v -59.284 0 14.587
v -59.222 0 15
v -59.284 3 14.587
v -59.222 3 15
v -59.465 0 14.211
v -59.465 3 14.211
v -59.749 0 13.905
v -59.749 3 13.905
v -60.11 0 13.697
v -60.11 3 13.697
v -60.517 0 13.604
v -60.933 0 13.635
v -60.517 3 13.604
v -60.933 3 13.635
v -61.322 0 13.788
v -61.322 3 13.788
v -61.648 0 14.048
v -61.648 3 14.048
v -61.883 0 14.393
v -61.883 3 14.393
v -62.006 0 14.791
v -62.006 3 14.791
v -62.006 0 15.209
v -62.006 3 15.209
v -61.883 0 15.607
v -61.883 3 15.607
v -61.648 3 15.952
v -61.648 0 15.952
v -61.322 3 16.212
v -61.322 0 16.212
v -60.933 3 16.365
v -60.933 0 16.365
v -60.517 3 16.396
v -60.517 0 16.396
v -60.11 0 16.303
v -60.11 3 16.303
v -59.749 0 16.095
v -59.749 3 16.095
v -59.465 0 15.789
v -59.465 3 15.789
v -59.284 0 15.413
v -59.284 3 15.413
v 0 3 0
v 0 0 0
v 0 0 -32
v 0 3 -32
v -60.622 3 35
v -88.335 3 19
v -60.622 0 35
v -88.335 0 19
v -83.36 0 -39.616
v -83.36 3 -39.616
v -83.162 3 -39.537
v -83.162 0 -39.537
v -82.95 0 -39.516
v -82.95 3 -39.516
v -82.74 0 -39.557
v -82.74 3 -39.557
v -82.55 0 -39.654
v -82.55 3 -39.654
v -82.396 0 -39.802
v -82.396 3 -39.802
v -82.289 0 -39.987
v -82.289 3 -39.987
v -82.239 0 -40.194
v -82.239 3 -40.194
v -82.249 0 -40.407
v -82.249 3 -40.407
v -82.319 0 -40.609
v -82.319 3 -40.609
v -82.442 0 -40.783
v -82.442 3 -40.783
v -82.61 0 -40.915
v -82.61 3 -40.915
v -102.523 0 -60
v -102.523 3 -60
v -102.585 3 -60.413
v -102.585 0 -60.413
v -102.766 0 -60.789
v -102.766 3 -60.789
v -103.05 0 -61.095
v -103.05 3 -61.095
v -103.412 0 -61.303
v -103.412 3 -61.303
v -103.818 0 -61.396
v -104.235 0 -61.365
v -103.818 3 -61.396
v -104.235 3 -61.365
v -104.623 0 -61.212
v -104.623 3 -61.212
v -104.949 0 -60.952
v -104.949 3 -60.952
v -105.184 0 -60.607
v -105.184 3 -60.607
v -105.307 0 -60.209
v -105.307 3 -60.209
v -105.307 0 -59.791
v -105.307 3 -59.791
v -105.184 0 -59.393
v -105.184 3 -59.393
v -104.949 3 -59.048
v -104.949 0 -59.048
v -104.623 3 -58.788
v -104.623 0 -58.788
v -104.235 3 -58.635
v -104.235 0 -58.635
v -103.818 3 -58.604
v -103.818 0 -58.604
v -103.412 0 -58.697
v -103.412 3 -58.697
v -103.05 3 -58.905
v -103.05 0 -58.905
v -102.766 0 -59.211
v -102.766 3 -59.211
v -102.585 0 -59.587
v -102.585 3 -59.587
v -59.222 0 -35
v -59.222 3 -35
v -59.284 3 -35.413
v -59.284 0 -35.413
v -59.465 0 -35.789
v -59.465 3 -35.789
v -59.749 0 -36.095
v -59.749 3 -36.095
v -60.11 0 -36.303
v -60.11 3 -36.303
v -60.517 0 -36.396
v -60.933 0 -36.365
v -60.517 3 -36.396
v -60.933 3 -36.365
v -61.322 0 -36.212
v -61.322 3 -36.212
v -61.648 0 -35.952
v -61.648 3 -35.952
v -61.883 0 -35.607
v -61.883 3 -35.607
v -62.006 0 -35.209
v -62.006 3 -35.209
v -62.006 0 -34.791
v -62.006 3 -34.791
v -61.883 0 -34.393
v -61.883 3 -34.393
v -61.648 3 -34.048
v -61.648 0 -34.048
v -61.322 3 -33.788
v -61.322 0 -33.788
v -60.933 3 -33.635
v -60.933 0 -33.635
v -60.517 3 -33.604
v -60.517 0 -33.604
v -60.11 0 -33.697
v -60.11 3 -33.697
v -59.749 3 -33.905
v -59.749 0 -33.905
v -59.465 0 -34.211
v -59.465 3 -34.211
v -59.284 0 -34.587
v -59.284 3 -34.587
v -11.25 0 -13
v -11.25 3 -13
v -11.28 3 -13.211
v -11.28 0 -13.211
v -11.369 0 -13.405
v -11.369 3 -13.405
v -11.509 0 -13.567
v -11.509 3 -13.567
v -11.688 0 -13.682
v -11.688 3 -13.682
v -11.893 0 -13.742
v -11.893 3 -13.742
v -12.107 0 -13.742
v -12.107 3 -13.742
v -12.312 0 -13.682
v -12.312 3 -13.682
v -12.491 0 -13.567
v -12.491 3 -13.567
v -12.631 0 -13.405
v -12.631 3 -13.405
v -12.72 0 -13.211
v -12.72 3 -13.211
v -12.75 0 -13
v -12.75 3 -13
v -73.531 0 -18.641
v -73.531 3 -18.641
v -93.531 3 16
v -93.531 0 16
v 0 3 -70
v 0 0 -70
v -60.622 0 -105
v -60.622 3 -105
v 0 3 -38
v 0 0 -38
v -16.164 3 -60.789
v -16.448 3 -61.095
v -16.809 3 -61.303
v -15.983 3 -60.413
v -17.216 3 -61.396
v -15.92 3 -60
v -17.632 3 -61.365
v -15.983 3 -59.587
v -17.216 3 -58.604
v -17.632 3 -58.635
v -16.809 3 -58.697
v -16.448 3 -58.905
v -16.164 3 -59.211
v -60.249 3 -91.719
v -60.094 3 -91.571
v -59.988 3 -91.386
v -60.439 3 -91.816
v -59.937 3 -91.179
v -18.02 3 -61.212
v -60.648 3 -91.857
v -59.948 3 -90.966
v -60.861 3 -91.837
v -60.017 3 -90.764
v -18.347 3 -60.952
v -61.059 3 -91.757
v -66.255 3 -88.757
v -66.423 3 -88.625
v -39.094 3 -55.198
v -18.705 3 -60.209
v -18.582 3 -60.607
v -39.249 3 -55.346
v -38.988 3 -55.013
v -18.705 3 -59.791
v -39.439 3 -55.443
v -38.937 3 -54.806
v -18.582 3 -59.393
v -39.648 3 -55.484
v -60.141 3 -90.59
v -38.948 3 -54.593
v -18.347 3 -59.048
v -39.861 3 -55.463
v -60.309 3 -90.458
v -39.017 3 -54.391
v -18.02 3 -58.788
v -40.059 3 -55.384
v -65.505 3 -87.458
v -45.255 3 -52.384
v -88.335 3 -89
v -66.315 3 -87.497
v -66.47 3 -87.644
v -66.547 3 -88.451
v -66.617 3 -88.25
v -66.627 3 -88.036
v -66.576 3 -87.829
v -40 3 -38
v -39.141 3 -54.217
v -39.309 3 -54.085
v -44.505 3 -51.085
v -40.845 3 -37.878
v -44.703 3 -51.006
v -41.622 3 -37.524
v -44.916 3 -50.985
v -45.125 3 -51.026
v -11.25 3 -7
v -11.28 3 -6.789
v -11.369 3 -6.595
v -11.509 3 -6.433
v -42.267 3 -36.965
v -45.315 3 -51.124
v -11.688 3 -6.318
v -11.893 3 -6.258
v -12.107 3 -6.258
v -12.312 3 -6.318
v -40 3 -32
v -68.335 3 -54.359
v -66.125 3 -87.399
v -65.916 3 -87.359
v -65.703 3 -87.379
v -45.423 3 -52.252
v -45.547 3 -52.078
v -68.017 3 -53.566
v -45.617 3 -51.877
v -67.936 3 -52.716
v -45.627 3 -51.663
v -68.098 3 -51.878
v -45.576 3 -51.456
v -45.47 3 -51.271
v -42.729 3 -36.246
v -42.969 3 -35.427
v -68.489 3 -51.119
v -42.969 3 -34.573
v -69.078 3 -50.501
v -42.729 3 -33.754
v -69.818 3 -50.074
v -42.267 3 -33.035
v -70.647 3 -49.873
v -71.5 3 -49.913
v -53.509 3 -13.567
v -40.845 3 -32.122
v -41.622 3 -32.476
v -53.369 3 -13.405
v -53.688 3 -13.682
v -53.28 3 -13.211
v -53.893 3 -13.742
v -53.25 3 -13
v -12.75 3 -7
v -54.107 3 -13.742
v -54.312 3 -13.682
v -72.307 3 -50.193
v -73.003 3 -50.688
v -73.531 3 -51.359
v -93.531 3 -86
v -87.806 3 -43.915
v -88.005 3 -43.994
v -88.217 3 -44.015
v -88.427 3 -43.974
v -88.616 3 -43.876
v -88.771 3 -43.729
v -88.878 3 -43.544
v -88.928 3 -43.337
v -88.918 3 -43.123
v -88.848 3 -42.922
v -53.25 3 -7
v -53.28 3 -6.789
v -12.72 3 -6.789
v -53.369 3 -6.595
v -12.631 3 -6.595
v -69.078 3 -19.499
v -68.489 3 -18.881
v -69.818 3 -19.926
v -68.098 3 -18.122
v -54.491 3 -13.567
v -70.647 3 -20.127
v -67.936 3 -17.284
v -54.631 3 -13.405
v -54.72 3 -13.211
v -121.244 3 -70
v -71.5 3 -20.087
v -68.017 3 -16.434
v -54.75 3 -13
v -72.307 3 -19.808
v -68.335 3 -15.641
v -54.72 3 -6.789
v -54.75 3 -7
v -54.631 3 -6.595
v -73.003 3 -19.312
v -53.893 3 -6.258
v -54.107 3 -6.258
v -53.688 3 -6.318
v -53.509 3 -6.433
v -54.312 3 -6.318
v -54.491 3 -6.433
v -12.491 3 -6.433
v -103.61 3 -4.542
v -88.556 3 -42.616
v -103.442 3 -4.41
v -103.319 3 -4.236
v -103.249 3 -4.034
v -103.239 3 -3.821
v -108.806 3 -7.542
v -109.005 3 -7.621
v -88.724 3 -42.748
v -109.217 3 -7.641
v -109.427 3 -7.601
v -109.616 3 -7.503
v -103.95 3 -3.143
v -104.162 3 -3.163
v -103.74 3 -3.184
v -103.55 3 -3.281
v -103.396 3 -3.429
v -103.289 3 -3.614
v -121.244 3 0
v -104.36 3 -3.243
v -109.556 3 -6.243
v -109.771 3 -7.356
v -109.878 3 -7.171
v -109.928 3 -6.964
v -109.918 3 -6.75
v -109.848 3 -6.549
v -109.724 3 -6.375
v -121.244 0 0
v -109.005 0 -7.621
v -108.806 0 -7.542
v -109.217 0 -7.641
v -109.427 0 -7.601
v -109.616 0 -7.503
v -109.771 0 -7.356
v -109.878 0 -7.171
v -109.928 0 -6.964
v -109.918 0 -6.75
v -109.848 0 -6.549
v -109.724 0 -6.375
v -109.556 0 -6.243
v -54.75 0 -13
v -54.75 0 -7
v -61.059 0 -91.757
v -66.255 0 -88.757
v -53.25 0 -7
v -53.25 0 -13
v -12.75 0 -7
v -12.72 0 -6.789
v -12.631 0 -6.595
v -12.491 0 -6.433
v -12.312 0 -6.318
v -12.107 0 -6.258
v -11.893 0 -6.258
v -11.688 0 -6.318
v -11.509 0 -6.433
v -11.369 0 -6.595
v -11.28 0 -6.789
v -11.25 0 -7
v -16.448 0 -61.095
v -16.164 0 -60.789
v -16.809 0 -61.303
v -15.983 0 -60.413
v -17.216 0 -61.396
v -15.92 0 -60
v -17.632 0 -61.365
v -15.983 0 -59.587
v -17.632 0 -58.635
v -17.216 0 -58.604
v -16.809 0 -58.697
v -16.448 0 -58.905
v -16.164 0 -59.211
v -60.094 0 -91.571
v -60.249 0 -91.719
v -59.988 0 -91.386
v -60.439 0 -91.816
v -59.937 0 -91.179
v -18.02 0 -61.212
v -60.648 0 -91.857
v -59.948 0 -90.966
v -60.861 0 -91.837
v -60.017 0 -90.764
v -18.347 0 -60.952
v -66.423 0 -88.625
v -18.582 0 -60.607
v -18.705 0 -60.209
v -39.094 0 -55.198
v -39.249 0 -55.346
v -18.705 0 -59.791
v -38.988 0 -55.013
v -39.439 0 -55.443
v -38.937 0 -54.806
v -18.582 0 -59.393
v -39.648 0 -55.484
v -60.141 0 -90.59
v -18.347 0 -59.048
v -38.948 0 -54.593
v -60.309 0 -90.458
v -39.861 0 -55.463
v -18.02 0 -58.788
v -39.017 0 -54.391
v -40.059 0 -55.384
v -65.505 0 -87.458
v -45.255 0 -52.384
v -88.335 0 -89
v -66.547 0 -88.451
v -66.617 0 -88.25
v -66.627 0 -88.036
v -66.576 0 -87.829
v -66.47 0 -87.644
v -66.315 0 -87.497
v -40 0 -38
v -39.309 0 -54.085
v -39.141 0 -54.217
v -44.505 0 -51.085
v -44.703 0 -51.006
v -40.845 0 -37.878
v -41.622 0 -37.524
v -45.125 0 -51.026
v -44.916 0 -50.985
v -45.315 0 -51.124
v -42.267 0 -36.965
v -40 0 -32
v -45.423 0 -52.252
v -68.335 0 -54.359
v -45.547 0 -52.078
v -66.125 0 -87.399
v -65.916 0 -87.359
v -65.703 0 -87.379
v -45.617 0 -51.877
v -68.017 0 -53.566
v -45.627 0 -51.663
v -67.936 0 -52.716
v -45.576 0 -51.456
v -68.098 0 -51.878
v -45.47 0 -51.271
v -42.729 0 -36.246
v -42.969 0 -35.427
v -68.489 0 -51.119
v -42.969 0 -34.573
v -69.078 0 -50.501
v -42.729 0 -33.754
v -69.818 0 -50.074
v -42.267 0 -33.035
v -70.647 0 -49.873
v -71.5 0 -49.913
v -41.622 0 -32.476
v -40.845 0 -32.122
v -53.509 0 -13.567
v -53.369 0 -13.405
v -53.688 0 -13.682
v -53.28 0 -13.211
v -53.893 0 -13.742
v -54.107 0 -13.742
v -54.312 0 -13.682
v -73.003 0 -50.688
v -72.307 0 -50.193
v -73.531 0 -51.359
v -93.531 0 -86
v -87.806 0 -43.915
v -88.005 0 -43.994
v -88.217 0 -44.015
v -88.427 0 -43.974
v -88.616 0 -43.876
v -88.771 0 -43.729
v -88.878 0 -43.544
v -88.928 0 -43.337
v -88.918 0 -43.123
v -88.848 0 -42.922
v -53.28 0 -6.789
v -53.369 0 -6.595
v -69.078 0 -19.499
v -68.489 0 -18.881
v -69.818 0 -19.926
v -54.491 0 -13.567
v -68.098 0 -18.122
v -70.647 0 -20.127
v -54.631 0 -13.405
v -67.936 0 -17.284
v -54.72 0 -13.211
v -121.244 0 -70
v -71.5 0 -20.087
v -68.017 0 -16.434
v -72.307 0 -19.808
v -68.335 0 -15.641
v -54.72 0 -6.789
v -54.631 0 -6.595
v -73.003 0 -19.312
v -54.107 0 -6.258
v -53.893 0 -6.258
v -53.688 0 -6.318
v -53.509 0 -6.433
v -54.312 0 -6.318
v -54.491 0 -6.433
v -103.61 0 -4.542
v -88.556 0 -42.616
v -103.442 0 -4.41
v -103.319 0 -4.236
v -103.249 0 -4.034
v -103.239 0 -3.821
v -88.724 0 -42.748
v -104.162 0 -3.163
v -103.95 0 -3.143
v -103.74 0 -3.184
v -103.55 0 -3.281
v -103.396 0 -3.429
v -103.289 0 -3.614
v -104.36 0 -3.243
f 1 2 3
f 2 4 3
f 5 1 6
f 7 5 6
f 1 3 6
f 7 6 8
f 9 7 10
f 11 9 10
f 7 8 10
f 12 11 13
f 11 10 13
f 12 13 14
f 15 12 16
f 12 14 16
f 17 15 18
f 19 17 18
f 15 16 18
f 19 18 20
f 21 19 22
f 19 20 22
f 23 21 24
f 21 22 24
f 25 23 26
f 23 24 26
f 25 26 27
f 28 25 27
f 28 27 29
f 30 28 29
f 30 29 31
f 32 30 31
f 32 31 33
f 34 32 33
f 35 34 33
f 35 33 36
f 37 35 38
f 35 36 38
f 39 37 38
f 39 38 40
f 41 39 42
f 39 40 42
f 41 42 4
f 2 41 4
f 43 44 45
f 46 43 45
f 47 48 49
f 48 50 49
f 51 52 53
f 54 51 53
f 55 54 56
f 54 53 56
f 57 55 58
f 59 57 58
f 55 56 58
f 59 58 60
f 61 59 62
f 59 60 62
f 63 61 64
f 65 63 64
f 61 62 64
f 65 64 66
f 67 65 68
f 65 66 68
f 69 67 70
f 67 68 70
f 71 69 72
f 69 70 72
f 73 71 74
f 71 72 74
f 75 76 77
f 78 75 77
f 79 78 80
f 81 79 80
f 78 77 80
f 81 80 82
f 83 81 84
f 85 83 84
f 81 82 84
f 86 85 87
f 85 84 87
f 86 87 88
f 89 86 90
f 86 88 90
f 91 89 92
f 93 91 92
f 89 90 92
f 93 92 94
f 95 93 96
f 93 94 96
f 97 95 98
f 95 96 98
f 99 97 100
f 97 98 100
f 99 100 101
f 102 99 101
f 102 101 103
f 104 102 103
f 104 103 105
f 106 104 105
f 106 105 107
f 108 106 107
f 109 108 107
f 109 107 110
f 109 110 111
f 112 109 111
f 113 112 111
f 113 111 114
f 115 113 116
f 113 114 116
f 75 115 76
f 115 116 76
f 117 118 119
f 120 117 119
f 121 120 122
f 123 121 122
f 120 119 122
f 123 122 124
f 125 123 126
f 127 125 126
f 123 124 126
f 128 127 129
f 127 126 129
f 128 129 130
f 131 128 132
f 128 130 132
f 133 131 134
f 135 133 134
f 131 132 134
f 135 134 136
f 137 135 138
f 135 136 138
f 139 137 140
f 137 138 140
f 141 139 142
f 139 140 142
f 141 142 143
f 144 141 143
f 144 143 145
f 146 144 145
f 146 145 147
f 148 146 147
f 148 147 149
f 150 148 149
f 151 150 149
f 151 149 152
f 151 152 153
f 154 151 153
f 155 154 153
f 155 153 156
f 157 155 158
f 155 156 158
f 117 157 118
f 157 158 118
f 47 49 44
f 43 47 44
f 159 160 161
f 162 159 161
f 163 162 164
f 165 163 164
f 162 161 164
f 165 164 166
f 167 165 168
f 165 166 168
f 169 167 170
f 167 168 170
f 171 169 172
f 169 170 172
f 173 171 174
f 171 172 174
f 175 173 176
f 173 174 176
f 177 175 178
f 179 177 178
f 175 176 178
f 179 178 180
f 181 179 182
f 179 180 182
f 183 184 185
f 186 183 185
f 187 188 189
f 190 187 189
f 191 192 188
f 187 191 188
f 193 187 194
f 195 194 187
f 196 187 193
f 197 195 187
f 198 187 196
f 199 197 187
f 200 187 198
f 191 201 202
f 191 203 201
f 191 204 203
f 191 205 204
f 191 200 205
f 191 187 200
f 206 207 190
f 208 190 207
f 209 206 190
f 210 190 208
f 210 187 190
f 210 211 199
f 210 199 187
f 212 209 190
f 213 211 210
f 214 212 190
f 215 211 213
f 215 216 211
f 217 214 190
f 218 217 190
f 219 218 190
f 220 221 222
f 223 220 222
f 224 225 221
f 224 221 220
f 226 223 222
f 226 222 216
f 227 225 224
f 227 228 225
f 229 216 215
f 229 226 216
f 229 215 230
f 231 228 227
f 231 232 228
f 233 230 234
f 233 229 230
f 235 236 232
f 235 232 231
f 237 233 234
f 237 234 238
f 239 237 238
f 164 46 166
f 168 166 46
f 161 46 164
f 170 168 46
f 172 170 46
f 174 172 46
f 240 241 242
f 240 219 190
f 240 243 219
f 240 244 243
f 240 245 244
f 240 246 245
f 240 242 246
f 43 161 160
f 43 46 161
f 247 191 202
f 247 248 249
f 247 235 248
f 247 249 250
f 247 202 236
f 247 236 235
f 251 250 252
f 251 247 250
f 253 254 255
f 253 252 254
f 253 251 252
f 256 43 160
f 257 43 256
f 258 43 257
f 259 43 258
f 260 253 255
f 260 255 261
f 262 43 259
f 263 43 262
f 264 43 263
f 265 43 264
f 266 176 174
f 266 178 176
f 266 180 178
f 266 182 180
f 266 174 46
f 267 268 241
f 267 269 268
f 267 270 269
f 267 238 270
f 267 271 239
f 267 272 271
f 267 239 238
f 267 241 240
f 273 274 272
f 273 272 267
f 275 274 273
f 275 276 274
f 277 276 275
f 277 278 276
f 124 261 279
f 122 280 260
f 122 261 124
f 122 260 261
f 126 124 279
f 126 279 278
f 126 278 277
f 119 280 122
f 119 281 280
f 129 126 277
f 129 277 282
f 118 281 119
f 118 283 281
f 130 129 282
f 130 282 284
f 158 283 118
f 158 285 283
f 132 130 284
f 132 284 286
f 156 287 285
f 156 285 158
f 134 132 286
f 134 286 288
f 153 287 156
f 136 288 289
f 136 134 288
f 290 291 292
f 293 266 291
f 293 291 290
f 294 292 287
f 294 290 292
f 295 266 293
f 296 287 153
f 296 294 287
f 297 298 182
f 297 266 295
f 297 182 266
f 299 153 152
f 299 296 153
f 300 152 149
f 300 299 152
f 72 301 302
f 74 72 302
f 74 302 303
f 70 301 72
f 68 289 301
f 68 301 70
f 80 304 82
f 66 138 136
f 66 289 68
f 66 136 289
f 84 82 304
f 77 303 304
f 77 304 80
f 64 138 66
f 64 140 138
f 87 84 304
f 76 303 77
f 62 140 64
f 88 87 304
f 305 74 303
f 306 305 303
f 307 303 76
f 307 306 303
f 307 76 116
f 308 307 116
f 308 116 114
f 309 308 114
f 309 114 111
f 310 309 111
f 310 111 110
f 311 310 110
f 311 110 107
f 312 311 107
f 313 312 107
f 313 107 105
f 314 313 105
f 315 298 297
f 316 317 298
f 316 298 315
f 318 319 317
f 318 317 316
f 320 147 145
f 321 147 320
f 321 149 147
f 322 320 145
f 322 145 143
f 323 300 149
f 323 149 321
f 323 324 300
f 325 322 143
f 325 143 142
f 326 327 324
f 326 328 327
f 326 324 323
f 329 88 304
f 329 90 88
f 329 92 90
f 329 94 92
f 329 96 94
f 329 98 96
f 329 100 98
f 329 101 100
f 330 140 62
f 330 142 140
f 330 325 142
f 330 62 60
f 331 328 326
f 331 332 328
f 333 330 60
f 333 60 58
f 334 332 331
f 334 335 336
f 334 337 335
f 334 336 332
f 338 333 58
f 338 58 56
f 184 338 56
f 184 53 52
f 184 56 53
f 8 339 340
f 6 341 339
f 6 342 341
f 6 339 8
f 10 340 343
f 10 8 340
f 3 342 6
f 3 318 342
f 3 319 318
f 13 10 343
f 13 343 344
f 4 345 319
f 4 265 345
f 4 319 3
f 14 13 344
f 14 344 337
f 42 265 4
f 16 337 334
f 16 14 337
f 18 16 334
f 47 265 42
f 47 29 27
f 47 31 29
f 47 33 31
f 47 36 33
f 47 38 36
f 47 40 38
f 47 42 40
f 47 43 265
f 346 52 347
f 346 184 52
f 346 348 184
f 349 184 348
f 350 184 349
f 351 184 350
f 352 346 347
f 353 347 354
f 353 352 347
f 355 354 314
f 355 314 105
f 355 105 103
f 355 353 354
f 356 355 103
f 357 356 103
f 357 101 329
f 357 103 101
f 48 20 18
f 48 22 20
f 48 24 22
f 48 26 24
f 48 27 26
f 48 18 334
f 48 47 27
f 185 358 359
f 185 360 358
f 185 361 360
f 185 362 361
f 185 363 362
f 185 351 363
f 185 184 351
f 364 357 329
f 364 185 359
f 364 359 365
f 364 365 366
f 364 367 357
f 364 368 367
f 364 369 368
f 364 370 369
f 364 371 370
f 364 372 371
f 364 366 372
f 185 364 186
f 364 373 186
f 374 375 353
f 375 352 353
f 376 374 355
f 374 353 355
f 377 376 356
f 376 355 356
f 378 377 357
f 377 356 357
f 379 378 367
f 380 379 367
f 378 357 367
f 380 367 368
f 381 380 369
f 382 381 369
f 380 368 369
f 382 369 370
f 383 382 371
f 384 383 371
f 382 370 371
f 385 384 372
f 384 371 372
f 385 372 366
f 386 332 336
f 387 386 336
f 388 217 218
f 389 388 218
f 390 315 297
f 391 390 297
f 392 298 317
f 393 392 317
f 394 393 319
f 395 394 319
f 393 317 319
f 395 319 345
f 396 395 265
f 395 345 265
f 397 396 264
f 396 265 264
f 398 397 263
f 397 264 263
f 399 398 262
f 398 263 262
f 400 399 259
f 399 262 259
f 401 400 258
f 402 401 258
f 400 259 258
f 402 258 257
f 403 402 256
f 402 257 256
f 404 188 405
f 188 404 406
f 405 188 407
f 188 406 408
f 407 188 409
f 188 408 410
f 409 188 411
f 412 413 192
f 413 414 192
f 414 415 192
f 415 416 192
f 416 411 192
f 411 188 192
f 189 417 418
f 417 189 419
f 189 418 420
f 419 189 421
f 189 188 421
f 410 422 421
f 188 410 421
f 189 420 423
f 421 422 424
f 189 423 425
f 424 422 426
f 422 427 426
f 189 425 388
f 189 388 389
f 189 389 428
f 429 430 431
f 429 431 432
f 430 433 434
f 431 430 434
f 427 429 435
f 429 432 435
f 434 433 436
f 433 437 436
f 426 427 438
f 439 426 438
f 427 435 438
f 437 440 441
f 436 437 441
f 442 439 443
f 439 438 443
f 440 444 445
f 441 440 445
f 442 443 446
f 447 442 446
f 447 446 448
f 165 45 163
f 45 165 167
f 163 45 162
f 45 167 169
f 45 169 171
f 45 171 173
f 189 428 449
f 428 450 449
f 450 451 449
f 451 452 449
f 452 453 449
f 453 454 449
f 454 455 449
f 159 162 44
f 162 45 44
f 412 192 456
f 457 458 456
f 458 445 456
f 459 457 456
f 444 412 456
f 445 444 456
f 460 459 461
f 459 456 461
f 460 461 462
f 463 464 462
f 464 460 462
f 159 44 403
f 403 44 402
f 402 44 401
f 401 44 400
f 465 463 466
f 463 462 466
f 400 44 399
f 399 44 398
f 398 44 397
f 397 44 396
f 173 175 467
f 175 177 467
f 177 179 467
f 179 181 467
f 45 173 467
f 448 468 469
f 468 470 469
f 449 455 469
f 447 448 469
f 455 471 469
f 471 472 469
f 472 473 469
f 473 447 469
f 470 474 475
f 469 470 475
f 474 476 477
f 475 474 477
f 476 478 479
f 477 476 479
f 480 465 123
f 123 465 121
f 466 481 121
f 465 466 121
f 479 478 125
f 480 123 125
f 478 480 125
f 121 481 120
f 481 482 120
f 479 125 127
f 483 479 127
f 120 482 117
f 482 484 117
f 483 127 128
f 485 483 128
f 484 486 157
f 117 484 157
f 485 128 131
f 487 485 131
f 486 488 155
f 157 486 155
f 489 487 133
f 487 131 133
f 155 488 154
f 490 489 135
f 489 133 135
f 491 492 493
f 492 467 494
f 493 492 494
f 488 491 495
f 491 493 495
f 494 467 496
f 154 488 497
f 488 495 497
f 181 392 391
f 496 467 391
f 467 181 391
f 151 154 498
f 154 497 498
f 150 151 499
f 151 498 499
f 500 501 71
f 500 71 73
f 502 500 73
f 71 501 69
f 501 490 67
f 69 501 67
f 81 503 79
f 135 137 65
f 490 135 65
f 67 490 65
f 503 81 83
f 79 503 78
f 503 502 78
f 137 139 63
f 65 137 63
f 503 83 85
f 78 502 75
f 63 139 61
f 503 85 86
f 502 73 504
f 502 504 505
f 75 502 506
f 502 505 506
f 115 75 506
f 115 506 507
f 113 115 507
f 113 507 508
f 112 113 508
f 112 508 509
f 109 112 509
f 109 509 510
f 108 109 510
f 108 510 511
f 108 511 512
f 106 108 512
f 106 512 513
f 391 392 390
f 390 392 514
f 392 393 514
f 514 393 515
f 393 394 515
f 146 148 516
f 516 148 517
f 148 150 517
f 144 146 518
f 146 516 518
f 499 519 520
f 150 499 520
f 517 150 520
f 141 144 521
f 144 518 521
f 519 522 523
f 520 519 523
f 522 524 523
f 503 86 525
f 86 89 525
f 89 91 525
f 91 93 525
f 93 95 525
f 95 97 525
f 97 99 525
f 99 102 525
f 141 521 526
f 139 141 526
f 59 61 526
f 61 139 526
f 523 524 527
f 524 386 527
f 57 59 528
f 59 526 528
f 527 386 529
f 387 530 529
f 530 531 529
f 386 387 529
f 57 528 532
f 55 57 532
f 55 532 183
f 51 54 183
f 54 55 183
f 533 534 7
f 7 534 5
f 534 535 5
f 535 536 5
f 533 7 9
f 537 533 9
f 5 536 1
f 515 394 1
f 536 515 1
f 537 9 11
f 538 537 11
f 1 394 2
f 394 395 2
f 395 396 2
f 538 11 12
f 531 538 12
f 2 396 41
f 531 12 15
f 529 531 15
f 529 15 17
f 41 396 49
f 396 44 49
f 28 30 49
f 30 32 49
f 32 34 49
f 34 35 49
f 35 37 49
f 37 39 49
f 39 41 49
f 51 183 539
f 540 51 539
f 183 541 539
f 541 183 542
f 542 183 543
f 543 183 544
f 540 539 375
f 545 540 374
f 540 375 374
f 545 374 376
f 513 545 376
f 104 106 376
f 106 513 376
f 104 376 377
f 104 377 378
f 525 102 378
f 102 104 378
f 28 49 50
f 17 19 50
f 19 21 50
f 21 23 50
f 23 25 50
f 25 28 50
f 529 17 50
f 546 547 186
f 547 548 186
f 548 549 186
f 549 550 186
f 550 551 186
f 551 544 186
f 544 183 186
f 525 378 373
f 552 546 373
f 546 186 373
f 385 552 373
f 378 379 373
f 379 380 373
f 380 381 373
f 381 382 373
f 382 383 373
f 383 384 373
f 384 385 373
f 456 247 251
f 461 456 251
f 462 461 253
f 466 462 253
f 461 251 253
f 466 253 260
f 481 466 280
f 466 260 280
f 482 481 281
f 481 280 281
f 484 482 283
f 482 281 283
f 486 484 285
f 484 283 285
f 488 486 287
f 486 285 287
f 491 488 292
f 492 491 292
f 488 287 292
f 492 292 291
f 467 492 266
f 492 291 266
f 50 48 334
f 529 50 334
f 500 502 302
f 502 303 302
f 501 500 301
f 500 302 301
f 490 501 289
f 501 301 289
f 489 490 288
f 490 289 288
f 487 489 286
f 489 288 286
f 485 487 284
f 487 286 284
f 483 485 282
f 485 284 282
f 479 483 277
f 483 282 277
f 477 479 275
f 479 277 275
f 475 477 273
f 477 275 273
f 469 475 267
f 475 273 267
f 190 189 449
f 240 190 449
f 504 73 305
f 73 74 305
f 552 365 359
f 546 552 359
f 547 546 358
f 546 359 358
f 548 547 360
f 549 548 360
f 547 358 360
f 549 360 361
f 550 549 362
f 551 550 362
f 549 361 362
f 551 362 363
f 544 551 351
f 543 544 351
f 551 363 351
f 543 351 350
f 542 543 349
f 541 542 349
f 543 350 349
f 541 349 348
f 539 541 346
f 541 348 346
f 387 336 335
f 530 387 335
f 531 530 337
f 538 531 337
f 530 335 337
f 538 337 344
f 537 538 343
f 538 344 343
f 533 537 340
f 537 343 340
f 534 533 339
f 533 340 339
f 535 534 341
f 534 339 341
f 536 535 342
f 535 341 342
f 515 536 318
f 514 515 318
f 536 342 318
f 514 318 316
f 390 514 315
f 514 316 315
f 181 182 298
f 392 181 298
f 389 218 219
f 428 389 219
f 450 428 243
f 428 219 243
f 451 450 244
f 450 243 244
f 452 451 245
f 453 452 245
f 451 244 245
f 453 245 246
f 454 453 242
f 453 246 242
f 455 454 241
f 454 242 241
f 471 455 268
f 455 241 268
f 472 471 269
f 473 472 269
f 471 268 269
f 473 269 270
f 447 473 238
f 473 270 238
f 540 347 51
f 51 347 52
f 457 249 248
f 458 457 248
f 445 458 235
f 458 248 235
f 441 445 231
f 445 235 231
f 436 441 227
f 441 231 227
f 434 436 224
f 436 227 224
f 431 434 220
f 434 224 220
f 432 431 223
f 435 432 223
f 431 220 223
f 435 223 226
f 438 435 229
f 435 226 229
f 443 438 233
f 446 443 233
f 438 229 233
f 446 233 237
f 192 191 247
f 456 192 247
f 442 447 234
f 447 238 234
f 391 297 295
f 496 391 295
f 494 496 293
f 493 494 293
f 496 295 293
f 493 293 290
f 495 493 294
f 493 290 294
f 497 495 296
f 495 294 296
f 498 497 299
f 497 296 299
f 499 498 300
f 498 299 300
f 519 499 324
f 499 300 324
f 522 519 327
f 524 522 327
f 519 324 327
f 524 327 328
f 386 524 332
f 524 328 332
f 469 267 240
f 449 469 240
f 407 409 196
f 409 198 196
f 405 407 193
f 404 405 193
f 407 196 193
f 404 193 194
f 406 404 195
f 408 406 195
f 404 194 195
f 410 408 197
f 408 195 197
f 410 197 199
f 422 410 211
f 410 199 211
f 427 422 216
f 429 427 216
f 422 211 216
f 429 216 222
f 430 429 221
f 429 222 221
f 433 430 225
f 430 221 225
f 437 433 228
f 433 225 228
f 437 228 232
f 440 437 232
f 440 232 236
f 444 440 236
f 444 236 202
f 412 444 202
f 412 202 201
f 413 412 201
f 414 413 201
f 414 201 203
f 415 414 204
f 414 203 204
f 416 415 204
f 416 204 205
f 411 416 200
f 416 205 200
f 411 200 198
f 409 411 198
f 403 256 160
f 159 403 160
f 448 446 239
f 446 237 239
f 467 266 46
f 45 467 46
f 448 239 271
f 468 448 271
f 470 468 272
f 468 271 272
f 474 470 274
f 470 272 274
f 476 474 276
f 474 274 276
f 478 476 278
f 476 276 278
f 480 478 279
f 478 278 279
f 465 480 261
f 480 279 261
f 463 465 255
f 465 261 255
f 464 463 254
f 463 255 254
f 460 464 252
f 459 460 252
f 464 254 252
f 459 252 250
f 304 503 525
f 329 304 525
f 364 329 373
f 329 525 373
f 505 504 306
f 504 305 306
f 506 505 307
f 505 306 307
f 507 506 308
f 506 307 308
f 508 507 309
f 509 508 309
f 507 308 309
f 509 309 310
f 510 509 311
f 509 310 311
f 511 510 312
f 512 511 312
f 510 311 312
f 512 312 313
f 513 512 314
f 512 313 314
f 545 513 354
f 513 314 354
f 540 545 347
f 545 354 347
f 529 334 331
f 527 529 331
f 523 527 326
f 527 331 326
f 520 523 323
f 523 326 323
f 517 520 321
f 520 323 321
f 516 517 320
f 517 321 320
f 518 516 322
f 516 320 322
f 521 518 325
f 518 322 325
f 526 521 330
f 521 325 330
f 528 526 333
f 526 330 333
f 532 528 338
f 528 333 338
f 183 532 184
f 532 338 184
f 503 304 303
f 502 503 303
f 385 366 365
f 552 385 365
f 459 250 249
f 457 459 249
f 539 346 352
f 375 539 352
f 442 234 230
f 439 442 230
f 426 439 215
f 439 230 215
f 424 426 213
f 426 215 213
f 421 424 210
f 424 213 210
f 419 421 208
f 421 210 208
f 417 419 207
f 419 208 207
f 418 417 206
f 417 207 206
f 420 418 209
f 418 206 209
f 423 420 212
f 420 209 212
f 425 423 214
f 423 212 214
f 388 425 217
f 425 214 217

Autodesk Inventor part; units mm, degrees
ref_plane "YZ Plane" through (0, 0, 0) normal (1, 0, 0) x (0, 1, 0)
ref_plane "XZ Plane" through (0, 0, 0) normal (0, 1, 0) x (-1, 0, 0)
ref_plane "XY Plane" through (0, 0, 0) normal (0, 0, 1) x (1, 0, 0)
sketch "Sketch1" plane through (0, 0, 0) normal (0, 1, 0) x (-1, 0, 0)
  point P0 (0, 0)
sketch "Sketch2" plane through (0, 0, 0) normal (0, 1, 0) x (-1, 0, 0)
  line L0 (0, 0) -> (0, -70)
  line L1 (0, -70) -> (54.3409, -70) construction
  line L2 (0, -70) -> (60.6218, -105)
  line L3 (0, -70) -> (70, -70) construction
  line L4 (60.6218, -105) -> (121.2436, -70)
  line L5 (121.2436, -70) -> (121.2436, 0)
  line L6 (121.2436, 0) -> (60.6218, 35)
  line L7 (60.6218, 35) -> (0, 0)
  dimension "d0" = 70
  dimension "d2" = 70
  dimension "d3" = 30
  dimension "d4" = 70
  dimension "d5" = 120
  dimension "d6" = 70
  dimension "d7" = 120
extrude "Extrusion1" add sketch "Sketch2" along normal blind 3
sketch "Sketch3" plane through (0, 3, 0) normal (0, 1, 0) x (1, 0, 0)
  line L0 (0, 0) -> (0, 70) projected
  line L1 (-121.2436, 0) -> (-60.6218, -35) projected
  line L2 (-90.9327, -17.5) -> (-50.9327, -17.5) construction
  line L3 (-60.6218, 105) -> (-121.2436, 70) projected
  line L4 (-90.9327, 87.5) -> (-50.9327, 87.5) construction
  line L5 (-70.9327, 17.141) -> (-90.9327, -17.5) construction
  line L6 (-73.5307, 18.641) -> (-93.5307, -16)
  line L7 (-88.3346, -19) -> (-68.3346, 15.641)
  arc A0 (-68.3346, 15.641) -> (-73.5307, 18.641) centre (-70.9327, 17.141) ccw
  arc A1 (-93.5307, -16) -> (-88.3346, -19) centre (-90.9327, -17.5) ccw
  line L8 (-70.9327, 52.859) -> (-90.9327, 87.5) construction
  line L9 (-68.3346, 54.359) -> (-88.3346, 89)
  line L10 (-93.5307, 86) -> (-73.5307, 51.359)
  arc A2 (-73.5307, 51.359) -> (-68.3346, 54.359) centre (-70.9327, 52.859) ccw
  arc A3 (-88.3346, 89) -> (-93.5307, 86) centre (-90.9327, 87.5) ccw
  line L11 (-40, 35) -> (0, 35) construction
  line L12 (-40, 32) -> (0, 32)
  line L13 (0, 38) -> (-40, 38)
  arc A4 (-40, 38) -> (-40, 32) centre (-40, 35) ccw
  arc A5 (0, 32) -> (0, 38) centre (0, 35) ccw
  point P0 (-80.9327, -0.1795)
  point P1 (-80.9327, 70.1795)
  point P2 (-20, 35)
  dimension "d10" = 40
  dimension "d11" = 40
  dimension "d13" = 40
  dimension "d15" = 6
  dimension "d16" = 6
  dimension "d17" = 6
extrude "Extrusion3" cut sketch "Sketch3" against normal blind 3
sketch "Sketch4" plane through (0, 3, 0) normal (0, 1, 0) x (1, 0, 0)
  line L0 (-54, 7) -> (-54, 13) construction
  line L1 (-53.25, 7) -> (-53.25, 13)
  line L2 (-54.75, 13) -> (-54.75, 7)
  arc A0 (-54.75, 7) -> (-53.25, 7) centre (-54, 7) ccw
  arc A1 (-53.25, 13) -> (-54.75, 13) centre (-54, 13) ccw
  line L3 (-54, 10) -> (-48, 10) construction
  line L4 (-12, 7) -> (-12, 13) construction
  line L5 (-11.25, 7) -> (-11.25, 13)
  line L6 (-12.75, 13) -> (-12.75, 7)
  arc A2 (-12.75, 7) -> (-11.25, 7) centre (-12, 7) ccw
  arc A3 (-11.25, 13) -> (-12.75, 13) centre (-12, 13) ccw
  line L7 (-12, 10) -> (-6, 10) construction
  arc A4 (-40, 38) -> (-40, 32) centre (-40, 35) ccw projected
  line L8 (-121.2436, 70) -> (-121.2436, 0) projected
  arc A5 (-73.5307, 51.359) -> (-68.3346, 54.359) centre (-70.9327, 52.859) ccw projected
  line L9 (-60.6218, -35) -> (0, 0) projected
  line L10 (-42.282, 53.2346) -> (-45.282, 58.4308) construction
  line L11 (-39.684, 54.7346) -> (-44.8801, 51.7346) construction
  arc A6 (-45.2551, 52.3841) -> (-44.5051, 51.0851) centre (-44.8801, 51.7346) ccw
  line L12 (-44.5051, 51.0851) -> (-39.309, 54.0851)
  arc A7 (-39.309, 54.0851) -> (-40.059, 55.3841) centre (-39.684, 54.7346) ccw
  line L13 (-40.059, 55.3841) -> (-45.2551, 52.3841)
  line L14 (-65.5051, 87.4582) -> (-60.309, 90.4582)
  arc A8 (-60.309, 90.4582) -> (-61.059, 91.7572) centre (-60.684, 91.1077) ccw
  arc A9 (-66.2551, 88.7572) -> (-65.5051, 87.4582) centre (-65.8801, 88.1077) ccw
  line L15 (-60.684, 91.1077) -> (-65.8801, 88.1077) construction
  line L16 (-61.059, 91.7572) -> (-66.2551, 88.7572)
  line L17 (-63.282, 89.6077) -> (-66.282, 94.8038) construction
  line L18 (-85.5833, 41.7654) -> (-88.5833, 36.5692) construction
  line L19 (-88.1814, 43.2654) -> (-82.9852, 40.2654) construction
  arc A10 (-83.3602, 39.6159) -> (-82.6102, 40.9149) centre (-82.9852, 40.2654) ccw
  line L20 (-82.6102, 40.9149) -> (-87.8064, 43.9149)
  arc A11 (-87.8064, 43.9149) -> (-88.5564, 42.6159) centre (-88.1814, 43.2654) ccw
  line L21 (-88.5564, 42.6159) -> (-83.3602, 39.6159)
  line L22 (-103.6102, 4.5418) -> (-108.8064, 7.5418)
  arc A12 (-108.8064, 7.5418) -> (-109.5564, 6.2428) centre (-109.1814, 6.8923) ccw
  arc A13 (-104.3602, 3.2428) -> (-103.6102, 4.5418) centre (-103.9852, 3.8923) ccw
  line L23 (-109.1814, 6.8923) -> (-103.9852, 3.8923) construction
  line L24 (-109.5564, 6.2428) -> (-104.3602, 3.2428)
  line L25 (-106.5833, 5.3923) -> (-109.5833, 0.1962) construction
  point P0 (-60.6218, 35)
  dimension "d25" = 3
  dimension "d27" = 1.5
  dimension "d29" = 3
  dimension "d31" = 1.5
  dimension "d48" = 360
extrude "Extrusion4" cut sketch "Sketch4" against normal blind 10
sketch "Sketch5" plane through (0, 0, 0) normal (0, -1, 0) x (1, 0, 0)
  arc A0 (-73.5307, -18.641) -> (-68.3346, -15.641) centre (-70.9327, -17.141) ccw projected
  line L0 (-70.9327, -17.141) -> (-50.3109, -17.141) construction
  arc A1 (-40, -32) -> (-40, -38) centre (-40, -35) ccw projected
  point P0 (0, 0)
  point P1 (-60.6218, -35)
sketch "Sketch6" plane through (0, 3, 0) normal (0, 1, 0) x (1, 0, 0)
  line L0 (-60.6218, -35) -> (0, 0) projected
  circle A0 centre (-60.6218, -15) radius 1.4
  circle A1 centre (-17.3205, 60) radius 1.4
  circle A2 centre (-103.923, 60) radius 1.4
  circle A3 centre (-60.6218, 35) radius 1.4
  dimension "d52" = 2.8
  dimension "d55" = 360
  dimension "d57" = 2.8
extrude "Extrusion5" cut sketch "Sketch6" against normal blind 10
properties part number "servo mount"
